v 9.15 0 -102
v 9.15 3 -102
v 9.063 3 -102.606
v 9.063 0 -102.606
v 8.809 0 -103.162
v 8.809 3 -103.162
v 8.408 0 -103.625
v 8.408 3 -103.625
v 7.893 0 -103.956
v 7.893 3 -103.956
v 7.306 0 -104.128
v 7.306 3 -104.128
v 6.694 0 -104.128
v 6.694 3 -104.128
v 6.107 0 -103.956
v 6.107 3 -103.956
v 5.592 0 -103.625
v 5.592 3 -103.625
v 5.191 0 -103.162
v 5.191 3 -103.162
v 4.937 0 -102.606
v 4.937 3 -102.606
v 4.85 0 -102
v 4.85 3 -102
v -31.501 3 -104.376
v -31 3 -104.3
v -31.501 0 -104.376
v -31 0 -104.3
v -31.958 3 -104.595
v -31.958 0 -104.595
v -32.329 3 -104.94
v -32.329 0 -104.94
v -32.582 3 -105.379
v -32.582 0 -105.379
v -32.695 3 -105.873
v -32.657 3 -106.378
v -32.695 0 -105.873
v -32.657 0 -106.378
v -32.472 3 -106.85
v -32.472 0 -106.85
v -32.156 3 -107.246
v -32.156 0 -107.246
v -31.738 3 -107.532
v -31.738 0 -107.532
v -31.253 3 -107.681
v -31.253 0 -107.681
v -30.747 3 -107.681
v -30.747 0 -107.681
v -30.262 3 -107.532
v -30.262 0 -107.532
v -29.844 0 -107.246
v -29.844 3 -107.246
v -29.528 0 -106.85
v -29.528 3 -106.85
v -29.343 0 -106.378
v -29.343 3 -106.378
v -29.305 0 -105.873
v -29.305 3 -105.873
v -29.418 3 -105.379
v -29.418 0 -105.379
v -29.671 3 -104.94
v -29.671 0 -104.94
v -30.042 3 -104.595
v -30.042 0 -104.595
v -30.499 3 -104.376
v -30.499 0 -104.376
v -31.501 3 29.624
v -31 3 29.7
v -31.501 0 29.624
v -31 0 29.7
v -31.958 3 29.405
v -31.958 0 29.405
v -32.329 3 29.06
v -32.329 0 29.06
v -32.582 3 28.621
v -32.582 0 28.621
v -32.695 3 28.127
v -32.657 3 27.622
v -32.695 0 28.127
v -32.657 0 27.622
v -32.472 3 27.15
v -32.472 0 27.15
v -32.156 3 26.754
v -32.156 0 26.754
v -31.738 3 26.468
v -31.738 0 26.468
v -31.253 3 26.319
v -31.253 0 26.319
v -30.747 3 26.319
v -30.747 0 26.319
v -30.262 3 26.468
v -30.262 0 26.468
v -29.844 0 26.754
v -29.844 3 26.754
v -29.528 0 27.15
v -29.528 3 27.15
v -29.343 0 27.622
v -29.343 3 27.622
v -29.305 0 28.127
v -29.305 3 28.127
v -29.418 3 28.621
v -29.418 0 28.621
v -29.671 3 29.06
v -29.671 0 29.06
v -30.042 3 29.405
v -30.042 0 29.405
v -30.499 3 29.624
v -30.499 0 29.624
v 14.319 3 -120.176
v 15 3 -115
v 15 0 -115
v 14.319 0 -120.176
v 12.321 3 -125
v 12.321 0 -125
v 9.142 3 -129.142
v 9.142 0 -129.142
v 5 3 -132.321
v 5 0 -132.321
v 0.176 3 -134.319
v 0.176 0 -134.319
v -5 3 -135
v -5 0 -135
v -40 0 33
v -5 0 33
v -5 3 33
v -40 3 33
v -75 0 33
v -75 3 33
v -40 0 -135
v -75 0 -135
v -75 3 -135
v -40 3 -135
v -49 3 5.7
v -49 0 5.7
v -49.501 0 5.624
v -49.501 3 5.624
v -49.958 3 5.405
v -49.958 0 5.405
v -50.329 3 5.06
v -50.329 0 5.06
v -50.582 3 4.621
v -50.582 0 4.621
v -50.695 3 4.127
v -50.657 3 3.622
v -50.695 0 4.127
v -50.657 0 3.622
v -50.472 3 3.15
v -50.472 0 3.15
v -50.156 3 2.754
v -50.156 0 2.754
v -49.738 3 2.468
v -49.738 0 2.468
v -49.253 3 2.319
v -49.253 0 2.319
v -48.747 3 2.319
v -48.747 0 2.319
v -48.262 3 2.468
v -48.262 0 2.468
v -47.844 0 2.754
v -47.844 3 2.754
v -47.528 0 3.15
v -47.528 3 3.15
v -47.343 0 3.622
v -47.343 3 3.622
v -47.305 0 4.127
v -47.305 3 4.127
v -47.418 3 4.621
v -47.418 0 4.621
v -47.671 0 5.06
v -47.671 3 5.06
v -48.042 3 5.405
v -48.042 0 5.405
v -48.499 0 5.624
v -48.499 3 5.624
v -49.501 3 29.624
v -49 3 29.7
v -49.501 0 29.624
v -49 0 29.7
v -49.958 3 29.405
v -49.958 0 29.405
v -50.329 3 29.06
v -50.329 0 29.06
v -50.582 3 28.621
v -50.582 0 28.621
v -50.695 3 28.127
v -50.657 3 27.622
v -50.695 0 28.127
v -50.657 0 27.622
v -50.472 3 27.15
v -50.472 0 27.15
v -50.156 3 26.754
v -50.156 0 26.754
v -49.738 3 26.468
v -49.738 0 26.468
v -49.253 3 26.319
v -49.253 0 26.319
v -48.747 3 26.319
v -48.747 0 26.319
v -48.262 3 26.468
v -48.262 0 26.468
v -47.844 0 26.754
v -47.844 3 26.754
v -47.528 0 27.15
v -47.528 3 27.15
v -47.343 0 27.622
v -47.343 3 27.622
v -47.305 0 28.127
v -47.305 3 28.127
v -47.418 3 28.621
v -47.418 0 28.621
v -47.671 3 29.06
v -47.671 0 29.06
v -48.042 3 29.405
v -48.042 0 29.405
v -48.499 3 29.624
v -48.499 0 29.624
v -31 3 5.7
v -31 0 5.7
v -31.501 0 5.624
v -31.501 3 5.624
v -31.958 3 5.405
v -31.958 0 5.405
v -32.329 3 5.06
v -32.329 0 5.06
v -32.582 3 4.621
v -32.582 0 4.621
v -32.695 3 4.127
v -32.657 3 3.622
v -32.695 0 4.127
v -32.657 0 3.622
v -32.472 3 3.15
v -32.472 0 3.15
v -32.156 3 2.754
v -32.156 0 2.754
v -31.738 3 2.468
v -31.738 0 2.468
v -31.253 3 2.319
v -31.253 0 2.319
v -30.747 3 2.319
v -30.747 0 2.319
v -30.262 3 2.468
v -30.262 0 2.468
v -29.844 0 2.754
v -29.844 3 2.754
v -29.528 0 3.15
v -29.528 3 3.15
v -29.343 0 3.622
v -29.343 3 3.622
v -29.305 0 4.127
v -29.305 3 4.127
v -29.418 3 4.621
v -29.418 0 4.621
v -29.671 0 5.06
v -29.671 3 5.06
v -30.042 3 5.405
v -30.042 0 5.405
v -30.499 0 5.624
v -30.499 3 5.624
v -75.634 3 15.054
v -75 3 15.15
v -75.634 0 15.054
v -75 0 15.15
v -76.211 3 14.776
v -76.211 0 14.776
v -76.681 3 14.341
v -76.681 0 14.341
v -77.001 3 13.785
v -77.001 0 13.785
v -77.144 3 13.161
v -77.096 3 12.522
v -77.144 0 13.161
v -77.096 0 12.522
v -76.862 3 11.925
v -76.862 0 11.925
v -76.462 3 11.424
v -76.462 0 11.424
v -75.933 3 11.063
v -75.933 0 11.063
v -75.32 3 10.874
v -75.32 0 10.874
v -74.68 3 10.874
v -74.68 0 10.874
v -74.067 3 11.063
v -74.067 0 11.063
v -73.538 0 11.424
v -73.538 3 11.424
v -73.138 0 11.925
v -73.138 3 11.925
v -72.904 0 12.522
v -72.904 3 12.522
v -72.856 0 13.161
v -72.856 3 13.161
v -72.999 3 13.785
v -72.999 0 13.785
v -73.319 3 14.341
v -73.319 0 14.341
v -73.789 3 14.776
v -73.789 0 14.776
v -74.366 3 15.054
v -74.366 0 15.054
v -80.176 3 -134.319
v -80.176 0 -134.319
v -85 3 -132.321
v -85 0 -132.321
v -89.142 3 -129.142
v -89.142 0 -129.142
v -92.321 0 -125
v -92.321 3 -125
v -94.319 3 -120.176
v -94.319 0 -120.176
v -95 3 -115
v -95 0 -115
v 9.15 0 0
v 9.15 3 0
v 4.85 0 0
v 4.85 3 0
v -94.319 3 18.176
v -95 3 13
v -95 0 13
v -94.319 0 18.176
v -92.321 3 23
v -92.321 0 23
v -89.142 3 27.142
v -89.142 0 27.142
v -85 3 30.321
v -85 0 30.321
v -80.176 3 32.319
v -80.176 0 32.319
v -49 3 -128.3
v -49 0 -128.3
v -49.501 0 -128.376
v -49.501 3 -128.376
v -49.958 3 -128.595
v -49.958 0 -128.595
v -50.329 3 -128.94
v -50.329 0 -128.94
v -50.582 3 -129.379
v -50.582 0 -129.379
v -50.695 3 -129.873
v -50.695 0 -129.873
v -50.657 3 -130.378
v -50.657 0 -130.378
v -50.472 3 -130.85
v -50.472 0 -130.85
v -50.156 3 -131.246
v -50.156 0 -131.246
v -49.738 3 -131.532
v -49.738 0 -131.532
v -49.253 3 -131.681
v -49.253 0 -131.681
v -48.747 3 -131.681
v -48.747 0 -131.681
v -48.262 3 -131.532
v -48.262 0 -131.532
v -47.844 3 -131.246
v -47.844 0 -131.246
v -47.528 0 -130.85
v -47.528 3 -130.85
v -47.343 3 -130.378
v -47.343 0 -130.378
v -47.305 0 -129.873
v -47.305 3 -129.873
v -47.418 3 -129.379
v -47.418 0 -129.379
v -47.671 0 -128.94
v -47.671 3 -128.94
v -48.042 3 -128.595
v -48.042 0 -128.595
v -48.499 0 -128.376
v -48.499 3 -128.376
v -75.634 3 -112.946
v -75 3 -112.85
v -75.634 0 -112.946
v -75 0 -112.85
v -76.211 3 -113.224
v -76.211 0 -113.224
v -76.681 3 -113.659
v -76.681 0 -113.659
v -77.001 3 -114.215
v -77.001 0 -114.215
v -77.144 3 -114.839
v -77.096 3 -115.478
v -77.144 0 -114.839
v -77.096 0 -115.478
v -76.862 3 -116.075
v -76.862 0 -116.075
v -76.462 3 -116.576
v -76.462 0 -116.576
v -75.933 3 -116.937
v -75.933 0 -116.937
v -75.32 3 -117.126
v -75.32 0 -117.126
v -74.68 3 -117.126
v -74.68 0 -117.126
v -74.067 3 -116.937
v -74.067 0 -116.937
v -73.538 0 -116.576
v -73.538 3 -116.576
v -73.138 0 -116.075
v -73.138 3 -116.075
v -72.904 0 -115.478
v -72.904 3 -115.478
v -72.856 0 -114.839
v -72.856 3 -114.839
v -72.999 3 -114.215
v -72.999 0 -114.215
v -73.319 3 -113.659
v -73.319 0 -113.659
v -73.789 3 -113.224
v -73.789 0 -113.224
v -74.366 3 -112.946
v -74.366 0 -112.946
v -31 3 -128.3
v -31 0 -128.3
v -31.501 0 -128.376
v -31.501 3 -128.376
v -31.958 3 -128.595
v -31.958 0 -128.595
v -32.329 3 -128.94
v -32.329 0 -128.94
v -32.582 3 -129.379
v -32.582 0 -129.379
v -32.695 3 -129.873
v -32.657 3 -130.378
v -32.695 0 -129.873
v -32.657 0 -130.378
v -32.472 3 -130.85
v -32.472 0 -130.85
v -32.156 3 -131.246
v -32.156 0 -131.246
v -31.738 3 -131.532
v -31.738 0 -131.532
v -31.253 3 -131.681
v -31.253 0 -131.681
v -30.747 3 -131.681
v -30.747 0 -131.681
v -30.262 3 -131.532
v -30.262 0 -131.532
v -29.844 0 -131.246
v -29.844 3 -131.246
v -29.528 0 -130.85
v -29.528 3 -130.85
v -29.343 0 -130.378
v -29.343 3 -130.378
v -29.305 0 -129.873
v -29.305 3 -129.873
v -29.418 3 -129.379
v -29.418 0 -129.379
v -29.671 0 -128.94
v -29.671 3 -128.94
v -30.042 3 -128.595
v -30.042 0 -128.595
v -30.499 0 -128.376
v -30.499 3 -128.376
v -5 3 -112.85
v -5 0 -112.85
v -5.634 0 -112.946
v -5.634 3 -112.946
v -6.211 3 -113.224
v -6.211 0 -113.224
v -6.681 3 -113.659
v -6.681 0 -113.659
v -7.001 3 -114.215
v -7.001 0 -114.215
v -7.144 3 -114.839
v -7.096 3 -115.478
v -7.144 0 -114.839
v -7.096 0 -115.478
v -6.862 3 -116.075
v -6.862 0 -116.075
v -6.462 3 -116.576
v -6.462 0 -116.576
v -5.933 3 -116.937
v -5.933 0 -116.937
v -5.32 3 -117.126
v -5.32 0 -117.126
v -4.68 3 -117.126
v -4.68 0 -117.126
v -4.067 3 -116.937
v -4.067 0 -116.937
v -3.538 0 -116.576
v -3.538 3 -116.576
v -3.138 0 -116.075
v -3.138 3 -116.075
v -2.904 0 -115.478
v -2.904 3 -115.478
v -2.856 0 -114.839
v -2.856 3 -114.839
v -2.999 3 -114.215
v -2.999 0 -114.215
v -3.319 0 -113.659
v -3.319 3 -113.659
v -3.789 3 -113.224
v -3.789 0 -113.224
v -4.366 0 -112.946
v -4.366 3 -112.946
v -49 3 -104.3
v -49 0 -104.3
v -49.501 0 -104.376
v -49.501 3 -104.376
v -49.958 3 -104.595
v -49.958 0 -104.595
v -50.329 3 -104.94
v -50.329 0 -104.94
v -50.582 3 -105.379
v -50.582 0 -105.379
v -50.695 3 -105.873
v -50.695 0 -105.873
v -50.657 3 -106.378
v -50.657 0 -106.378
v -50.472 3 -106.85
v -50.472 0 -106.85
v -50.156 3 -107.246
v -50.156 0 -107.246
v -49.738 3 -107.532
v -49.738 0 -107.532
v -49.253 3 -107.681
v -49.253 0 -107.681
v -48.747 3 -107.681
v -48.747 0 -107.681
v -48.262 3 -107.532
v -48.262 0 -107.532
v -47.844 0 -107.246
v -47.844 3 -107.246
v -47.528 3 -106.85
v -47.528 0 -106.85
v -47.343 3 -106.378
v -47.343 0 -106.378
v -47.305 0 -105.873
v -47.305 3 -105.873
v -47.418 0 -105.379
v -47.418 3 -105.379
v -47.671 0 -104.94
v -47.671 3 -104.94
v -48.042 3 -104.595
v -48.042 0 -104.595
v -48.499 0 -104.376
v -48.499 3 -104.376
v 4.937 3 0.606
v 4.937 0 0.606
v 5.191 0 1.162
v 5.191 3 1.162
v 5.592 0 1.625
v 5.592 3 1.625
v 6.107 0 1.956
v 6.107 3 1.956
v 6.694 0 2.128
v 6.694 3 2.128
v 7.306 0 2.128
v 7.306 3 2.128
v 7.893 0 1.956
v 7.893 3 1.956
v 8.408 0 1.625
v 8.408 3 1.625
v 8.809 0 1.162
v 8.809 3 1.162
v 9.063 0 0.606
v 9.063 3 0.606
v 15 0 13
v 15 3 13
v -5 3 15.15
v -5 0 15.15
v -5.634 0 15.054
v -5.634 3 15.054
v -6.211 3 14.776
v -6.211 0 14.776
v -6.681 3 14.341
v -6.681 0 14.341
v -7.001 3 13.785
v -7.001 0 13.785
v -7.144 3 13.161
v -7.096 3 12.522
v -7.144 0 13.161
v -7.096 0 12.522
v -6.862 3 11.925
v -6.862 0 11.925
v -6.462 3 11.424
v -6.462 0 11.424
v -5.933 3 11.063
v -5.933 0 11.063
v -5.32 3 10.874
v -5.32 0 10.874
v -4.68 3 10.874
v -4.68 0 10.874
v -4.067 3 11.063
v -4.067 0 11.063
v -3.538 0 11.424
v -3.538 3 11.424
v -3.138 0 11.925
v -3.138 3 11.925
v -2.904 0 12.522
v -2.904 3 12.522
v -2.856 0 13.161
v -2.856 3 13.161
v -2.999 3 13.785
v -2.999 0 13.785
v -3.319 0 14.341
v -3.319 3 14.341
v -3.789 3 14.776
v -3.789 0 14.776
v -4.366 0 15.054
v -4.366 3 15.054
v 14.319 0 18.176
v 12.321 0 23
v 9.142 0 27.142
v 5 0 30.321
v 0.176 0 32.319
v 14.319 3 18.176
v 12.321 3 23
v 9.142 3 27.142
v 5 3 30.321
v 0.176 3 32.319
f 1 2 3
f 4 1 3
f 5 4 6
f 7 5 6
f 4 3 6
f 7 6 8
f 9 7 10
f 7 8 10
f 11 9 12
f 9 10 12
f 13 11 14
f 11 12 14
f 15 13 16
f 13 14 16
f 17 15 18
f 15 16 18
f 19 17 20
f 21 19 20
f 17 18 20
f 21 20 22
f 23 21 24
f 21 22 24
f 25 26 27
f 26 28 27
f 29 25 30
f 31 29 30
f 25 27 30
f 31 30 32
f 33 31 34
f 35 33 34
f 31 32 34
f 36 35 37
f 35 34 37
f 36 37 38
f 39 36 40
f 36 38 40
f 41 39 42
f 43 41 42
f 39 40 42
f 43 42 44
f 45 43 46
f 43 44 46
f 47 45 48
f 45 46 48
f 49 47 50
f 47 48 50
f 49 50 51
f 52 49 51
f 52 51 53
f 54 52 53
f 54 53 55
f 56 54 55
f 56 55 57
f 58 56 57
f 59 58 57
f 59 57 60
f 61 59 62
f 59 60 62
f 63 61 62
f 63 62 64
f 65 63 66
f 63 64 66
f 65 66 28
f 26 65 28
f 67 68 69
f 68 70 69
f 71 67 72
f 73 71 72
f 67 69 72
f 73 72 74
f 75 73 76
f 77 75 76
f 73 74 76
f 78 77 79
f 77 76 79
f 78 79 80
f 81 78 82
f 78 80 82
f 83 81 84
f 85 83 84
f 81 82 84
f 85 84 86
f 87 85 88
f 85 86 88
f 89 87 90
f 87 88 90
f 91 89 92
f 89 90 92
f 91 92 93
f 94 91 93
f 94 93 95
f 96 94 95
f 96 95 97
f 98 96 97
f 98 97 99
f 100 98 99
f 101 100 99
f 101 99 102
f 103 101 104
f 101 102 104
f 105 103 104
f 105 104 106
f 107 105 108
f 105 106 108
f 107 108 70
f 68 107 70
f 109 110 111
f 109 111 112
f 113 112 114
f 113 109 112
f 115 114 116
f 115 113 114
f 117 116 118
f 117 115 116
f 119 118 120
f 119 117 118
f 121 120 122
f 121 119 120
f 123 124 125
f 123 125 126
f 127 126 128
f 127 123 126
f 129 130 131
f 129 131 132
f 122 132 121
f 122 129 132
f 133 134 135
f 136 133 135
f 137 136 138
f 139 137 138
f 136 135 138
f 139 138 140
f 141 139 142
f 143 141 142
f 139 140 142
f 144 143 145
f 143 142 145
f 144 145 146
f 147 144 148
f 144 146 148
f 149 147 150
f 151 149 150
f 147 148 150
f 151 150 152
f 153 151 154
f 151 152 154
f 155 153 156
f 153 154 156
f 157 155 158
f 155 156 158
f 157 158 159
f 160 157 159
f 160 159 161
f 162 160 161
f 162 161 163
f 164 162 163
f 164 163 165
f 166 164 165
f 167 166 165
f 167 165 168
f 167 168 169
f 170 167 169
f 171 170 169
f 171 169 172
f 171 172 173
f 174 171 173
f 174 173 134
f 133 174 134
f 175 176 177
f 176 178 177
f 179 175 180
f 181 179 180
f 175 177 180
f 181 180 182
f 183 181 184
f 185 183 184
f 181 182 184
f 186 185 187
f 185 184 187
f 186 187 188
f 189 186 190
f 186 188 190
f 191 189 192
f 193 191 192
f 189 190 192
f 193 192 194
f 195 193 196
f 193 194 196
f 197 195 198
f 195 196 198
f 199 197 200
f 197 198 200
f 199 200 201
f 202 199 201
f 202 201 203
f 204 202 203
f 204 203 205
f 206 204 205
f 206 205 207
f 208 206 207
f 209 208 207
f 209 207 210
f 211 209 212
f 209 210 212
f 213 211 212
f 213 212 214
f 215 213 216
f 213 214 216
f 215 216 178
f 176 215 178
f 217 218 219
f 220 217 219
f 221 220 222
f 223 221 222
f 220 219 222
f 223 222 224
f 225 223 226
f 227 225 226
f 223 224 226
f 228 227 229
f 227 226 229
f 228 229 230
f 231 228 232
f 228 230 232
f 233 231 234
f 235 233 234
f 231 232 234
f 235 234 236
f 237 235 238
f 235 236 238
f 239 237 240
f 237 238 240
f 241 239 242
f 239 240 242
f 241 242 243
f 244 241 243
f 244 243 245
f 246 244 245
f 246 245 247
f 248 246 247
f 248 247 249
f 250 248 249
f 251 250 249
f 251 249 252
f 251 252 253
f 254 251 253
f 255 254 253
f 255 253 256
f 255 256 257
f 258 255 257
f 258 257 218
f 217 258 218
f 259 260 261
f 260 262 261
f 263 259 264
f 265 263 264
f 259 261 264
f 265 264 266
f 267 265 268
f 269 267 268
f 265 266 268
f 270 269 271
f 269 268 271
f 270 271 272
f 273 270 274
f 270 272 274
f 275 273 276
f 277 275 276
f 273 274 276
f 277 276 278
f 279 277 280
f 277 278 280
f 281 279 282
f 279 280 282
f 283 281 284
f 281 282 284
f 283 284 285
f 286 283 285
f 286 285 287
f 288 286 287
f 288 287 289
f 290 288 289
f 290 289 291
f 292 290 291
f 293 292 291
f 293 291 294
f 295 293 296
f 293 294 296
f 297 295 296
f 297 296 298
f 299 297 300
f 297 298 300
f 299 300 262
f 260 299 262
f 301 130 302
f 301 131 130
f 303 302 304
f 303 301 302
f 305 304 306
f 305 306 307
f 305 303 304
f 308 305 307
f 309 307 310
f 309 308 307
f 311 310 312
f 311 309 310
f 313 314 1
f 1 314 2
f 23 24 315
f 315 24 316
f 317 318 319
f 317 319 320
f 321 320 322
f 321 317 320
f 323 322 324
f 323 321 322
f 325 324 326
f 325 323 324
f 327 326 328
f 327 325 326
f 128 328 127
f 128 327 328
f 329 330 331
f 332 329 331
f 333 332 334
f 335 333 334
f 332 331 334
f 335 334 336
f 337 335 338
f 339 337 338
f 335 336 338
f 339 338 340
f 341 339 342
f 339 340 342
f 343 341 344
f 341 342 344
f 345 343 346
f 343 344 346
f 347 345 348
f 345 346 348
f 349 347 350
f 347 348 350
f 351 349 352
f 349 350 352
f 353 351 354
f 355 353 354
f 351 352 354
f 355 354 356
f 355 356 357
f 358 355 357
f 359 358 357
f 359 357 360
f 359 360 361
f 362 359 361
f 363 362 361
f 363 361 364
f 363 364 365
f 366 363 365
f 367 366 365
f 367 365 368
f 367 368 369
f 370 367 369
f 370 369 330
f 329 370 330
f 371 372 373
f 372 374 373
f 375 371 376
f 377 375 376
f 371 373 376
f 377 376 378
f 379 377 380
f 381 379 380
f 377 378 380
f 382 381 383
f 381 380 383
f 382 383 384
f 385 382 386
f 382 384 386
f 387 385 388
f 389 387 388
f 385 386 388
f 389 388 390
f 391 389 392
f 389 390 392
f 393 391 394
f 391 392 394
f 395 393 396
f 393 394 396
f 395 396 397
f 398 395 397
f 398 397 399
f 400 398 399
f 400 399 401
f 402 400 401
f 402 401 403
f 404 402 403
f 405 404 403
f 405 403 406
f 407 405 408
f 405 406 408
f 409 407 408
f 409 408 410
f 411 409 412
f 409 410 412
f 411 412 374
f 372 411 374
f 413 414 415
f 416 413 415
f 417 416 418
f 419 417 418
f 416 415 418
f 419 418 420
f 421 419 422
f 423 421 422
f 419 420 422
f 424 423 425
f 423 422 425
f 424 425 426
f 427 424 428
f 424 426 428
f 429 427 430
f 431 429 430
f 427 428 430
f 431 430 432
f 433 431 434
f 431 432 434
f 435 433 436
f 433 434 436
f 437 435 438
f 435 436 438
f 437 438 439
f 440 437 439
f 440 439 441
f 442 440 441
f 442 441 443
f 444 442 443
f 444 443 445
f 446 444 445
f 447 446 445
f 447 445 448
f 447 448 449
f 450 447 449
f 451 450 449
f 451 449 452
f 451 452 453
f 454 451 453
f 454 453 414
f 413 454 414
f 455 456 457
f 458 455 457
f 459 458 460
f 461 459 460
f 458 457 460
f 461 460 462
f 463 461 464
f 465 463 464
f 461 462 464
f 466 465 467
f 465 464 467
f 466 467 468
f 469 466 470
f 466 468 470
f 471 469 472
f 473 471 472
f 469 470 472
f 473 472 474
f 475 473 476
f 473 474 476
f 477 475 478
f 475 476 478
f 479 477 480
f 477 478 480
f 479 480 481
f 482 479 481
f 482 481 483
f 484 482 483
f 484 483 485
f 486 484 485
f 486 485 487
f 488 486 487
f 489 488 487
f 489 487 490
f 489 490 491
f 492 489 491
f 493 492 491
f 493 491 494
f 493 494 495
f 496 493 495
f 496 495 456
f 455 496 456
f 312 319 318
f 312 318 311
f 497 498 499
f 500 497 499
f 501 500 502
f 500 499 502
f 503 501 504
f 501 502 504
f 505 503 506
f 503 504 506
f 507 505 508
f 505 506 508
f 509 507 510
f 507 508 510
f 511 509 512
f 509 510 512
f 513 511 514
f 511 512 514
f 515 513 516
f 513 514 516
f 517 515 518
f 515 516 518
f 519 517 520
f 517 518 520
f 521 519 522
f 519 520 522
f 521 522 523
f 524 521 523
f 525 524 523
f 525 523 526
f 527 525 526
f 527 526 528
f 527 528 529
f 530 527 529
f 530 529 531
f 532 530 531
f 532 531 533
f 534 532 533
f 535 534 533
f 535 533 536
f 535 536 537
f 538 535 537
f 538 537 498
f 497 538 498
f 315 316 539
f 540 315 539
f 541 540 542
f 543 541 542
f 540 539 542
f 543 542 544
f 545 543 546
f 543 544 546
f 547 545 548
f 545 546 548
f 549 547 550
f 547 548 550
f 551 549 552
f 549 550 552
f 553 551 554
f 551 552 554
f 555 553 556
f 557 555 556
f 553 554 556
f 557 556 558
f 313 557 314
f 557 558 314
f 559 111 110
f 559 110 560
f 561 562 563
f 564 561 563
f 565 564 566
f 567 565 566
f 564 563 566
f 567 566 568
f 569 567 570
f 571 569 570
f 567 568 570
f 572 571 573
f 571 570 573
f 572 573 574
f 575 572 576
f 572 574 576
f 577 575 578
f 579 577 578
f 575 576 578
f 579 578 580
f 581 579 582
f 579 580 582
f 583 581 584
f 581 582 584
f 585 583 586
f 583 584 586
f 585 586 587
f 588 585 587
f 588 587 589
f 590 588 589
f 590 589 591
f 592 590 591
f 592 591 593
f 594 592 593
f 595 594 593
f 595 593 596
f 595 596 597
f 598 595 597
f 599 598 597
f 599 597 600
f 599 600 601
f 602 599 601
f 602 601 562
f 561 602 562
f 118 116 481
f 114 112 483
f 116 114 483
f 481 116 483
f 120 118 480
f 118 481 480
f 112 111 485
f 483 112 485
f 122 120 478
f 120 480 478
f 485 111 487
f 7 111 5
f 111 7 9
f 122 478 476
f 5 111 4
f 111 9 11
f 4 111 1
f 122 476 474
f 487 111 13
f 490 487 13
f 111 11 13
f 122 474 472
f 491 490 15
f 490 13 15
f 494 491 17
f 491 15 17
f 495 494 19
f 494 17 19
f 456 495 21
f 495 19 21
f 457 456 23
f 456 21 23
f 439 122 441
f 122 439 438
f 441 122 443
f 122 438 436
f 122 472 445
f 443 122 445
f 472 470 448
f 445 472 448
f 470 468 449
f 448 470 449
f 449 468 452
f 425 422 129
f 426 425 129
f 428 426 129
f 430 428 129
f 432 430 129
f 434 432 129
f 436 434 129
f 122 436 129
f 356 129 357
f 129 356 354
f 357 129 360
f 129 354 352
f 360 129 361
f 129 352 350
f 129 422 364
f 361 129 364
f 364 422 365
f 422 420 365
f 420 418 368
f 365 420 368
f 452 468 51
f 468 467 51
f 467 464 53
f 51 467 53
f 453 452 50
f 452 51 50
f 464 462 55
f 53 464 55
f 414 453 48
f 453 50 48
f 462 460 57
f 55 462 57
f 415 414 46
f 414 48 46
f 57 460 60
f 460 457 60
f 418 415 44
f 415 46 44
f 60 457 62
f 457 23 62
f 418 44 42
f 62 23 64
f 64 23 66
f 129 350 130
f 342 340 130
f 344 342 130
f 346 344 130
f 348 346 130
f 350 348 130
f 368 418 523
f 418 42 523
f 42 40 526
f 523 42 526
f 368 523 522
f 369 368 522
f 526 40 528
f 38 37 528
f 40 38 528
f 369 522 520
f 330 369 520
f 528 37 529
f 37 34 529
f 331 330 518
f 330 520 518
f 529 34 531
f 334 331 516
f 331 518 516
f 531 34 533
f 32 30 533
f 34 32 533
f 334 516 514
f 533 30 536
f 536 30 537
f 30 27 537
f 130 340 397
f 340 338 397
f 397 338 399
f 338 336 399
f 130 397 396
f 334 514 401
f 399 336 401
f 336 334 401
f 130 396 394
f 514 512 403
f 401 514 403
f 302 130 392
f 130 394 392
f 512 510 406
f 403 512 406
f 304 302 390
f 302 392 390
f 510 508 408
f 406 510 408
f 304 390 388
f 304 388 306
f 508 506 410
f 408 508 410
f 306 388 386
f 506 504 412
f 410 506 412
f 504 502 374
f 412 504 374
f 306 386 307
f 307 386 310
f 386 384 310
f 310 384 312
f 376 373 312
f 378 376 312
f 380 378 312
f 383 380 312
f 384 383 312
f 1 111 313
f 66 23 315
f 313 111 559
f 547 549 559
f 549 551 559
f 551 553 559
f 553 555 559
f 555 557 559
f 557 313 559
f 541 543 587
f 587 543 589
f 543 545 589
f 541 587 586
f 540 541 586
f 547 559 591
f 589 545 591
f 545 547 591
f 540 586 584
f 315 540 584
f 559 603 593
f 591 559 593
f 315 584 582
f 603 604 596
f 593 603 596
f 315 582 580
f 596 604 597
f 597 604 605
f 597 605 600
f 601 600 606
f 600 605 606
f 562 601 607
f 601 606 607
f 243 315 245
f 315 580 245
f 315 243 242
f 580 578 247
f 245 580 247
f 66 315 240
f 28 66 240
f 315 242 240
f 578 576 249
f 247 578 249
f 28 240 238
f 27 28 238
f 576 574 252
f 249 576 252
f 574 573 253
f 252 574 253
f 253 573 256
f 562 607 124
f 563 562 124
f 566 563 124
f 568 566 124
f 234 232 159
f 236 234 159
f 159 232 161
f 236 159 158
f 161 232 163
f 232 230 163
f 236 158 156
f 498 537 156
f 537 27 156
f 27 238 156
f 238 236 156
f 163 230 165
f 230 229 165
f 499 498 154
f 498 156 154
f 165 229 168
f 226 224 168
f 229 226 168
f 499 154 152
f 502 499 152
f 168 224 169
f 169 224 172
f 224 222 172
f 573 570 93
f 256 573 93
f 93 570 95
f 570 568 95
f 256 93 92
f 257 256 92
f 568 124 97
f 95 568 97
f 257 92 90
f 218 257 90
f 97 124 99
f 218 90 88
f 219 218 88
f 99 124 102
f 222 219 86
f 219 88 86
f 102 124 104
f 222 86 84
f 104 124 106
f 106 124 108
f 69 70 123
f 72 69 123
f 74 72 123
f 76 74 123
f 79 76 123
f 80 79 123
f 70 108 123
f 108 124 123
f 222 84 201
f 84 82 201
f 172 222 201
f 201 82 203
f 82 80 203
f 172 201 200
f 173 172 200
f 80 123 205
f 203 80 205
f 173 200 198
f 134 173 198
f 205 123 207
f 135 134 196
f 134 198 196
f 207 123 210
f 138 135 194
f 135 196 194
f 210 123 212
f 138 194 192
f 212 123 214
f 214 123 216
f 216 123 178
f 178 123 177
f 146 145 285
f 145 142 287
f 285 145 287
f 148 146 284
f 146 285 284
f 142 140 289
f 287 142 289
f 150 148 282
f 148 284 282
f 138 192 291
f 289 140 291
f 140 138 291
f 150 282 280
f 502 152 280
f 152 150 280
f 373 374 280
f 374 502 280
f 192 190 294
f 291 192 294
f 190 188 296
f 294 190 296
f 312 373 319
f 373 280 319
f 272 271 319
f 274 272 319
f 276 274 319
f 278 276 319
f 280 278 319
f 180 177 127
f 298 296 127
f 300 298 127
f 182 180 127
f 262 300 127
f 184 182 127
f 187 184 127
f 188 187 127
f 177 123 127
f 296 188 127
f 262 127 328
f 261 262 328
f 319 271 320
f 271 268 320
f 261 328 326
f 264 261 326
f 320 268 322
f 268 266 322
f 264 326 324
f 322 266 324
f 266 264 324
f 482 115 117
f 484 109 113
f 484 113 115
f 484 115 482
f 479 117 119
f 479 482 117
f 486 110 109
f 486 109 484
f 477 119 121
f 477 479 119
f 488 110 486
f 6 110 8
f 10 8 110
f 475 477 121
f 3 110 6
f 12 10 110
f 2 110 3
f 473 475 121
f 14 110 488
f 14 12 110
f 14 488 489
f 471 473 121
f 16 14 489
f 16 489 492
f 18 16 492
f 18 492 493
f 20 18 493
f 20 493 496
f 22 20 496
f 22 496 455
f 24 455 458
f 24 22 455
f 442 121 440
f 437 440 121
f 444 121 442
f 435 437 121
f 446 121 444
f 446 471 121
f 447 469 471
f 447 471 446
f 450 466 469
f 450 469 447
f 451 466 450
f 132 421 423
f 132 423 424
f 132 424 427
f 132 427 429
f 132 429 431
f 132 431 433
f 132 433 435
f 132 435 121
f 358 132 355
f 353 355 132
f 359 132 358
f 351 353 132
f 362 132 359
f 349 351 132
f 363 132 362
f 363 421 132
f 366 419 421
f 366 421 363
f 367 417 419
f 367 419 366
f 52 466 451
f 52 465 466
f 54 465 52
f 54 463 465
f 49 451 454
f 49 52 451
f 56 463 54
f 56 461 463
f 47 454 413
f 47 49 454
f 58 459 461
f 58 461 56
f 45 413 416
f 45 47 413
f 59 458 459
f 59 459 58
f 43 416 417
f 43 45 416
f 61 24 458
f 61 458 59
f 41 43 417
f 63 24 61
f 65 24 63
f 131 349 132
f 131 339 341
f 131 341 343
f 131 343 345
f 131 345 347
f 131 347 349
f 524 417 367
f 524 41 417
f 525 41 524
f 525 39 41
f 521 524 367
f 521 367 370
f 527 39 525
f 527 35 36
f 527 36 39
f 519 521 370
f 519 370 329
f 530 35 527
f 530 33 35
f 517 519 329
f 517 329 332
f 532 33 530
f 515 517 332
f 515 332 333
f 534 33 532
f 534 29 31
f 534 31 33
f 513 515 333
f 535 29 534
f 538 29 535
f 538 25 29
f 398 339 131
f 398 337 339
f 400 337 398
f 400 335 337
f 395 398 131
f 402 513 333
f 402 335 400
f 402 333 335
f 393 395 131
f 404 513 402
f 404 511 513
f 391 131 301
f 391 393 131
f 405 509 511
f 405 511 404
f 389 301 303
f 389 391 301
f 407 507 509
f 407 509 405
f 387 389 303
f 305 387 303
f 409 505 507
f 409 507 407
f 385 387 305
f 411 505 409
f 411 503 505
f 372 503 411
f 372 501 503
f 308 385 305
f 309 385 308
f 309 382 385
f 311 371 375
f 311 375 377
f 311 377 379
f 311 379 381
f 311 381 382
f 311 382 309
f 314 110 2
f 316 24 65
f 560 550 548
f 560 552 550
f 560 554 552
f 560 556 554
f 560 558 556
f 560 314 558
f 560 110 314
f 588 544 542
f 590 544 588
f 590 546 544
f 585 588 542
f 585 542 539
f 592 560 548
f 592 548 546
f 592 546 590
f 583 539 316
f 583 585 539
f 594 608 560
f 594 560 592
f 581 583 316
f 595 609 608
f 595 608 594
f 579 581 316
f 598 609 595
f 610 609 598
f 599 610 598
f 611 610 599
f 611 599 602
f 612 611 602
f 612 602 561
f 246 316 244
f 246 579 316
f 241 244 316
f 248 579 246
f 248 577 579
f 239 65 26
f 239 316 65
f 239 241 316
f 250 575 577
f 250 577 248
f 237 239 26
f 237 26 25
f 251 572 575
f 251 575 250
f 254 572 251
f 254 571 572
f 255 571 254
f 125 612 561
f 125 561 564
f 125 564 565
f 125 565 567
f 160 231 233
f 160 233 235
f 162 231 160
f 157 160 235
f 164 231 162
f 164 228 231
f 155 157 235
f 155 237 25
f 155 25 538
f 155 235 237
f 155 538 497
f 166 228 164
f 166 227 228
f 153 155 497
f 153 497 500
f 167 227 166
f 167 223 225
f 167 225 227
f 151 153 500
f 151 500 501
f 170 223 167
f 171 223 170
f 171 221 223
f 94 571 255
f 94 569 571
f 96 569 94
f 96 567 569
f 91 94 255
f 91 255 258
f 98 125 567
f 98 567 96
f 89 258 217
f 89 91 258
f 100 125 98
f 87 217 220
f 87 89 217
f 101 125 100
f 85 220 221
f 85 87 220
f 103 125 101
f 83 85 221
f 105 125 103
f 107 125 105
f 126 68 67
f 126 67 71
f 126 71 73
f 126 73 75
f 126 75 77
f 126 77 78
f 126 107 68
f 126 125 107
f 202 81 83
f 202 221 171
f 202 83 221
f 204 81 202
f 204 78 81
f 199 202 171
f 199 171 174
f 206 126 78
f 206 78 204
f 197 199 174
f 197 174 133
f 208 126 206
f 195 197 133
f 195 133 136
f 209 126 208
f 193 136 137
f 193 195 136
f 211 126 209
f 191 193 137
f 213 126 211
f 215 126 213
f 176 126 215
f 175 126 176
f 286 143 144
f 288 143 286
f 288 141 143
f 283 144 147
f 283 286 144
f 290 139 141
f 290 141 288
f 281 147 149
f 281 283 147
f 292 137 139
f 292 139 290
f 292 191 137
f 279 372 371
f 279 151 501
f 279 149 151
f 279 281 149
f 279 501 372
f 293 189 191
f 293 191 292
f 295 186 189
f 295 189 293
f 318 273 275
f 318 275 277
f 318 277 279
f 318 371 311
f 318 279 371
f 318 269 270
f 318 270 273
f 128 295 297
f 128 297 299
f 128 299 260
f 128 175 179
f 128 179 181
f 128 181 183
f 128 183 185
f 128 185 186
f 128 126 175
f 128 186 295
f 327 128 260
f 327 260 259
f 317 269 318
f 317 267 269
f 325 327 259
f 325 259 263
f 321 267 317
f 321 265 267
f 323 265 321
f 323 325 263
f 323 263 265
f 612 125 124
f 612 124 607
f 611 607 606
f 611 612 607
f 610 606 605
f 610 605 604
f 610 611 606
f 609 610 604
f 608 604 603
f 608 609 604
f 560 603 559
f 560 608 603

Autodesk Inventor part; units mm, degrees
sketch "Sketch1" plane through (0, 0, 0) normal (0, 1, 0) x (-1, 0, 0)
  line L0 (-15, 33) -> (95, 33)
  line L1 (95, 33) -> (95, -135)
  line L2 (95, -135) -> (-15, -135)
  line L3 (-15, -135) -> (-15, 33)
  line L4 (95, 33) -> (95, 15)
  line L5 (-15, 33) -> (-15, 13)
  line L6 (95, -135) -> (95, -115)
  line L7 (-15, -135) -> (-15, -115)
  line L8 (40, -135) -> (40, -130)
  line L9 (31, -130) -> (49, -130)
  line L10 (49, -130) -> (49, -106)
  line L11 (49, -106) -> (31, -106)
  line L12 (31, -106) -> (31, -130)
  line L13 (40, 33) -> (40, 28)
  line L14 (31, 28) -> (49, 28)
  line L15 (49, 28) -> (49, 4)
  line L16 (49, 4) -> (31, 4)
  line L17 (31, 4) -> (31, 28)
  point P0 (0, 0)
  point P1 (47.5, 33)
  point P2 (12.5, 33)
  point P3 (67.5, -135)
  point P4 (32.5, -135)
  dimension "d21" = 0
  dimension "d4" = 110
  dimension "d5" = 168
  dimension "d22" = 5
  dimension "d23" = 18
  dimension "d24" = 24
  dimension "d25" = 5
  dimension "d26" = 18
  dimension "d27" = 24
extrude "Extrusion2" add sketch "Sketch1" along normal blind 3 contours L9 L12 L11 L10 | L14 L15 L16 L17 | L0 L1 L2 L3
hole "Hole1" at (-49, 0, 28) at (-49, 0, 4) at (-31, 0, 28) at (-31, 0, 4) at (-49, 0, -130) at (-31, 0, -130) at (-31, 0, -106) at (-49, 0, -106) direction (0, -1, 0) diameter 3.4 end through all both
fillet "Fillet1" radius 20 4 edges at (15, 1.5, 33) (-95, 1.5, 33) (15, 1.5, -135) (-95, 1.5, -135)
ref_plane "Work Plane1" through (-75, 0, -51) normal (0, 0, 1) x (1, 0, 0)
ref_plane "Work Plane2" through (-40, 0, 13) normal (1, 0, 0) x (0, 0, -1)
sketch "Sketch2" plane through (0, 3, 0) normal (0, 1, 0) x (1, 0, 0)
  arc A0 (-95, -13) -> (-75, -33) centre (-75, -13) ccw projected
  line L0 (-95, -33) -> (-95, -13)
  line L1 (-75, -33) -> (-5, -33) projected
  line L2 (-95, -33) -> (-75, -33)
  line L3 (-75, -33) -> (-75, -13)
  line L4 (-75, -13) -> (-95, -13)
  arc A1 (-5, -33) -> (15, -13) centre (-5, -13) ccw projected
  line L5 (15, -33) -> (-5, -33)
  line L6 (15, -33) -> (15, -13)
  line L7 (-5, -33) -> (-5, -13)
  line L8 (-5, -13) -> (15, -13)
  arc A2 (15, 115) -> (-5, 135) centre (-5, 115) ccw projected
  line L9 (15, 135) -> (15, 115)
  line L10 (15, 135) -> (-5, 135)
  line L11 (-5, 135) -> (-5, 115)
  line L12 (-5, 115) -> (15, 115)
  arc A3 (-75, 135) -> (-95, 115) centre (-75, 115) ccw projected
  line L13 (-95, 135) -> (-95, 115)
  line L14 (-95, 135) -> (-75, 135)
  line L15 (-95, 115) -> (-95, -13) projected
  line L16 (-95, 115) -> (-75, 115)
  line L17 (-75, 115) -> (-75, 135)
  point P0 (0, 0)
hole "Hole2" at (-75, 3, 13) at (-75, 3, -115) at (-5, 3, -115) at (-5, 3, 13) direction (0, -1, 0) diameter 4.3 end through all
sketch "Sketch4" plane through (0, 3, 0) normal (0, 1, 0) x (1, 0, 0)
  line L0 (15, -13) -> (15, 115) projected
  line L1 (15, 0) -> (7, 0)
  line L2 (-95, 115) -> (-95, -13) projected
  line L3 (15, 0) -> (15, 102)
  line L4 (15, 102) -> (7, 102)
  line L5 (7, 0) -> (7, 102)
  line L6 (7, 0) -> (7, 102) construction
  line L7 (9.15, 0) -> (9.15, 102)
  line L8 (4.85, 102) -> (4.85, 0)
  arc A0 (4.85, 0) -> (9.15, 0) centre (7, 0) ccw
  arc A1 (9.15, 102) -> (4.85, 102) centre (7, 102) ccw
  point P0 (0, 0)
  point P1 (7, 51)
  dimension "d45" = 8
  dimension "d46" = 102
  dimension "d47" = 8
  dimension "d48" = 4.3
extrude "Extrusion3" cut sketch "Sketch4" against normal through all contours A0 L8 A1 L4 L5 L1 | L1 L5 L4 L7
ref_plane "Work Plane3" through (7, 3, -104.15) normal (1, 0, 0) x (0, 0, -1)
properties part number "BedHousingFrame"
